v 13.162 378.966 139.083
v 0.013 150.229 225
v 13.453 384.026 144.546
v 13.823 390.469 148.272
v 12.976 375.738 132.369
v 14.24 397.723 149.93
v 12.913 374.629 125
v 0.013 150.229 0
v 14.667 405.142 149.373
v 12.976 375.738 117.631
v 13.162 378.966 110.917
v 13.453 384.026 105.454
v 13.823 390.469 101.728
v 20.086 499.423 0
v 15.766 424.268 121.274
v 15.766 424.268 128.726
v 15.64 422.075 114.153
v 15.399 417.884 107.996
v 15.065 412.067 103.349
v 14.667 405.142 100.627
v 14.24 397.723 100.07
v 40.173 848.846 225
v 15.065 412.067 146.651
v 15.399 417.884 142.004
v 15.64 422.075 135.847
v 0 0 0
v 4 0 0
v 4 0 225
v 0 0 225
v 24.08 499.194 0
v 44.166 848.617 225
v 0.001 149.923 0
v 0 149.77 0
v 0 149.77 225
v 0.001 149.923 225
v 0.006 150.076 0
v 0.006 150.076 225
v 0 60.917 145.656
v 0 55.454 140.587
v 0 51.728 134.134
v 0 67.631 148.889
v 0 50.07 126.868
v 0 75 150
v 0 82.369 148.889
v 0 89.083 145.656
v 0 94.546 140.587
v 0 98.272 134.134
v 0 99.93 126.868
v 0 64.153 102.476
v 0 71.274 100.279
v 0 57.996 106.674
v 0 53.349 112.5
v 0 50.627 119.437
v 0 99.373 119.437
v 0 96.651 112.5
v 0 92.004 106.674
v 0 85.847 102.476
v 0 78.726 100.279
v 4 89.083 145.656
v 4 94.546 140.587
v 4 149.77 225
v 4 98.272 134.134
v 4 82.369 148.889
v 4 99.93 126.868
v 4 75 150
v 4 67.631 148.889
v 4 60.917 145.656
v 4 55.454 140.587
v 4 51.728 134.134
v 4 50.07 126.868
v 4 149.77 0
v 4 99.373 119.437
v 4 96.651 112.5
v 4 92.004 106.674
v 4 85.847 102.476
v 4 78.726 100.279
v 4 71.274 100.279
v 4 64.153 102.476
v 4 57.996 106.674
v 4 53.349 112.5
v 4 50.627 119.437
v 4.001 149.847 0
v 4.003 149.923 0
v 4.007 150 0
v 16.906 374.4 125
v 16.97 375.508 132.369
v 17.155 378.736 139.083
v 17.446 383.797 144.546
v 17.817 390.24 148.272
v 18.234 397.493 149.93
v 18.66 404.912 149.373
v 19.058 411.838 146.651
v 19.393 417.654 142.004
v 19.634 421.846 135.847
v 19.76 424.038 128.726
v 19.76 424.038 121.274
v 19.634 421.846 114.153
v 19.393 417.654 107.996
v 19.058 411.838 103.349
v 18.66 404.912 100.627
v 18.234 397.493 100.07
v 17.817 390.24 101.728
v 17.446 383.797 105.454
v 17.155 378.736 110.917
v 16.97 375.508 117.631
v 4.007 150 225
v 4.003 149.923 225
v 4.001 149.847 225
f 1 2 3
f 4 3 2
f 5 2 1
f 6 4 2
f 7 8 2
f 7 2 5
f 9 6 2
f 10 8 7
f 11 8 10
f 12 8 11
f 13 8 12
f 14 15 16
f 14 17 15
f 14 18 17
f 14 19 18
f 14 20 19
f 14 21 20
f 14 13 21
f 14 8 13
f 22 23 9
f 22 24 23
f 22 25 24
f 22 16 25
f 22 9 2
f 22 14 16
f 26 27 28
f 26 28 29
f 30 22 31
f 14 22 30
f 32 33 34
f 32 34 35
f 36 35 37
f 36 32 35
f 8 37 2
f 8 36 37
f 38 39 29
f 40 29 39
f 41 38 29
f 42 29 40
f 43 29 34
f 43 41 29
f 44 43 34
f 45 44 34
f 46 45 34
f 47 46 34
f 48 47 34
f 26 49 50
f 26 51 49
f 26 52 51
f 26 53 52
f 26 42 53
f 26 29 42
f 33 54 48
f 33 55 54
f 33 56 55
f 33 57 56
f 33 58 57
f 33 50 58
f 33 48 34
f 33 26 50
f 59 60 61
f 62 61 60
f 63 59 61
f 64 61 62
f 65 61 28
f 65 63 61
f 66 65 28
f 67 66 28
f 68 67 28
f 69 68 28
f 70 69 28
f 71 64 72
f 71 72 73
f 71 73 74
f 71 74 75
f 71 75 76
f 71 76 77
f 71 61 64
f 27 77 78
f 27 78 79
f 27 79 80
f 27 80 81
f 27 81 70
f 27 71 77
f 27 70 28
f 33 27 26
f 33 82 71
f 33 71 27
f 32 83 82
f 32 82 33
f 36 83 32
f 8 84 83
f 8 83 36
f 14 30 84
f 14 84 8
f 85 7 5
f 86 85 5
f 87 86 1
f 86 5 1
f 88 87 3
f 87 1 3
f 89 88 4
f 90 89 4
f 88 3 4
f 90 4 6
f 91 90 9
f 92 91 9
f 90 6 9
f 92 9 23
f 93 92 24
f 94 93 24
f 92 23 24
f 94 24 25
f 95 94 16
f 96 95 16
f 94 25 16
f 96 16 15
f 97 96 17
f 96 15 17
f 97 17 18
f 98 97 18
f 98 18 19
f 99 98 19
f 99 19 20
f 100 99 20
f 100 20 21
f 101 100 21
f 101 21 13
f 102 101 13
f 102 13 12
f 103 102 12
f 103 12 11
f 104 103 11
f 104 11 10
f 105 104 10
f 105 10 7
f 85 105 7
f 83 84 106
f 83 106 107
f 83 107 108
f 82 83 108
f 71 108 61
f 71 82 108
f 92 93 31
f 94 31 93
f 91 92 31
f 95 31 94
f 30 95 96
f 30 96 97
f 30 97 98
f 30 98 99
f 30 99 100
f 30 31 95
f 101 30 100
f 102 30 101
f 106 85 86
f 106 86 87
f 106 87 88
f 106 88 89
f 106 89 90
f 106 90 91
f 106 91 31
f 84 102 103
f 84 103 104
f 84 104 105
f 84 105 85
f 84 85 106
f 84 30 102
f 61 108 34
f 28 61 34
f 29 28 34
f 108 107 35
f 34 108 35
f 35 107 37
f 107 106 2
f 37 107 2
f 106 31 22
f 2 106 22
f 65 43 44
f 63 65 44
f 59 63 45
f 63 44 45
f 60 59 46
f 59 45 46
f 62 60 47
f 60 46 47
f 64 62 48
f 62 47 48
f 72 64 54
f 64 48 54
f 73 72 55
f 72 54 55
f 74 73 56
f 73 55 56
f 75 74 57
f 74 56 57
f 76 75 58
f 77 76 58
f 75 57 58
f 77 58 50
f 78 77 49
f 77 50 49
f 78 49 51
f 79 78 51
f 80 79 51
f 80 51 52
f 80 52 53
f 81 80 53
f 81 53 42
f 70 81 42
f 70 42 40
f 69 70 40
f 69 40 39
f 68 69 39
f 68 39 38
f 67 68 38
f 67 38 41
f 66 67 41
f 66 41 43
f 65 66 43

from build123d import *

# Parameters (mm, degrees)
SM_BASE_FLANGE_1_DEPTH = 225
CUT_EXTRUDE_1_DEPTH    = 10
SKETCH_7_R             = 25
CUT_EXTRUDE_2_DEPTH    = 10
SKETCH_8_R             = 25
CUT_EXTRUDE_3_DEPTH    = 10


# Sheet-metal steps are written as plain solids
with BuildPart() as part:
    # Sketch 1 → 基体-法兰1 (new body)
    with BuildSketch(Plane.XY):
        with BuildLine():
            Line((0, 0), (0, 149.77025154))
            ThreePointArc((0, 149.77025154), (0.003296983, 149.999905315), (0.013185214, 150.2293698))
            Line((0.013185214, 150.2293698), (40.172847796, 848.846293758))
            Line((40.172847796, 848.846293758), (44.166255189, 848.616734628))
            Line((44.166255189, 848.616734628), (4.006592607, 149.99981067))
            ThreePointArc((4.006592607, 149.99981067), (4.001648491, 149.885078427), (4, 149.77025154))
            Line((4, 149.77025154), (4, 0))
            Line((4, 0), (0, 0))
        make_face()
    extrude(amount=SM_BASE_FLANGE_1_DEPTH)

    # 草图6 → 切除-拉伸1 (cut)
    with BuildSketch(Plane(origin=(-8.594279324, 0.494038071, 0), x_dir=(0, 0, 1), z_dir=(-0.9983518482263736, 0.0573897825660991, 0))):
        Polygon((0, 849.752777234), (225, 849.752777234), (0, 499.752777234), align=None)
    extrude(amount=-CUT_EXTRUDE_1_DEPTH, mode=Mode.SUBTRACT)

    # 草图7 → 切除-拉伸2 (cut)
    with BuildSketch(Plane.ZY):
        with Locations((125, 75)):
            Circle(SKETCH_7_R)
    extrude(amount=-CUT_EXTRUDE_2_DEPTH, mode=Mode.SUBTRACT)

    # 草图8 → 切除-拉伸3 (cut)
    with BuildSketch(Plane(origin=(-8.594279324, 0.494038071, 0), x_dir=(0, 0, 1), z_dir=(-0.9983518482263735, 0.05738978256609909, 0))):
        with Locations(Location((125, 399.752777234, 0), (0, 0, 270))):
            Circle(SKETCH_8_R)
    extrude(amount=-CUT_EXTRUDE_3_DEPTH, mode=Mode.SUBTRACT)


solid = part.part
